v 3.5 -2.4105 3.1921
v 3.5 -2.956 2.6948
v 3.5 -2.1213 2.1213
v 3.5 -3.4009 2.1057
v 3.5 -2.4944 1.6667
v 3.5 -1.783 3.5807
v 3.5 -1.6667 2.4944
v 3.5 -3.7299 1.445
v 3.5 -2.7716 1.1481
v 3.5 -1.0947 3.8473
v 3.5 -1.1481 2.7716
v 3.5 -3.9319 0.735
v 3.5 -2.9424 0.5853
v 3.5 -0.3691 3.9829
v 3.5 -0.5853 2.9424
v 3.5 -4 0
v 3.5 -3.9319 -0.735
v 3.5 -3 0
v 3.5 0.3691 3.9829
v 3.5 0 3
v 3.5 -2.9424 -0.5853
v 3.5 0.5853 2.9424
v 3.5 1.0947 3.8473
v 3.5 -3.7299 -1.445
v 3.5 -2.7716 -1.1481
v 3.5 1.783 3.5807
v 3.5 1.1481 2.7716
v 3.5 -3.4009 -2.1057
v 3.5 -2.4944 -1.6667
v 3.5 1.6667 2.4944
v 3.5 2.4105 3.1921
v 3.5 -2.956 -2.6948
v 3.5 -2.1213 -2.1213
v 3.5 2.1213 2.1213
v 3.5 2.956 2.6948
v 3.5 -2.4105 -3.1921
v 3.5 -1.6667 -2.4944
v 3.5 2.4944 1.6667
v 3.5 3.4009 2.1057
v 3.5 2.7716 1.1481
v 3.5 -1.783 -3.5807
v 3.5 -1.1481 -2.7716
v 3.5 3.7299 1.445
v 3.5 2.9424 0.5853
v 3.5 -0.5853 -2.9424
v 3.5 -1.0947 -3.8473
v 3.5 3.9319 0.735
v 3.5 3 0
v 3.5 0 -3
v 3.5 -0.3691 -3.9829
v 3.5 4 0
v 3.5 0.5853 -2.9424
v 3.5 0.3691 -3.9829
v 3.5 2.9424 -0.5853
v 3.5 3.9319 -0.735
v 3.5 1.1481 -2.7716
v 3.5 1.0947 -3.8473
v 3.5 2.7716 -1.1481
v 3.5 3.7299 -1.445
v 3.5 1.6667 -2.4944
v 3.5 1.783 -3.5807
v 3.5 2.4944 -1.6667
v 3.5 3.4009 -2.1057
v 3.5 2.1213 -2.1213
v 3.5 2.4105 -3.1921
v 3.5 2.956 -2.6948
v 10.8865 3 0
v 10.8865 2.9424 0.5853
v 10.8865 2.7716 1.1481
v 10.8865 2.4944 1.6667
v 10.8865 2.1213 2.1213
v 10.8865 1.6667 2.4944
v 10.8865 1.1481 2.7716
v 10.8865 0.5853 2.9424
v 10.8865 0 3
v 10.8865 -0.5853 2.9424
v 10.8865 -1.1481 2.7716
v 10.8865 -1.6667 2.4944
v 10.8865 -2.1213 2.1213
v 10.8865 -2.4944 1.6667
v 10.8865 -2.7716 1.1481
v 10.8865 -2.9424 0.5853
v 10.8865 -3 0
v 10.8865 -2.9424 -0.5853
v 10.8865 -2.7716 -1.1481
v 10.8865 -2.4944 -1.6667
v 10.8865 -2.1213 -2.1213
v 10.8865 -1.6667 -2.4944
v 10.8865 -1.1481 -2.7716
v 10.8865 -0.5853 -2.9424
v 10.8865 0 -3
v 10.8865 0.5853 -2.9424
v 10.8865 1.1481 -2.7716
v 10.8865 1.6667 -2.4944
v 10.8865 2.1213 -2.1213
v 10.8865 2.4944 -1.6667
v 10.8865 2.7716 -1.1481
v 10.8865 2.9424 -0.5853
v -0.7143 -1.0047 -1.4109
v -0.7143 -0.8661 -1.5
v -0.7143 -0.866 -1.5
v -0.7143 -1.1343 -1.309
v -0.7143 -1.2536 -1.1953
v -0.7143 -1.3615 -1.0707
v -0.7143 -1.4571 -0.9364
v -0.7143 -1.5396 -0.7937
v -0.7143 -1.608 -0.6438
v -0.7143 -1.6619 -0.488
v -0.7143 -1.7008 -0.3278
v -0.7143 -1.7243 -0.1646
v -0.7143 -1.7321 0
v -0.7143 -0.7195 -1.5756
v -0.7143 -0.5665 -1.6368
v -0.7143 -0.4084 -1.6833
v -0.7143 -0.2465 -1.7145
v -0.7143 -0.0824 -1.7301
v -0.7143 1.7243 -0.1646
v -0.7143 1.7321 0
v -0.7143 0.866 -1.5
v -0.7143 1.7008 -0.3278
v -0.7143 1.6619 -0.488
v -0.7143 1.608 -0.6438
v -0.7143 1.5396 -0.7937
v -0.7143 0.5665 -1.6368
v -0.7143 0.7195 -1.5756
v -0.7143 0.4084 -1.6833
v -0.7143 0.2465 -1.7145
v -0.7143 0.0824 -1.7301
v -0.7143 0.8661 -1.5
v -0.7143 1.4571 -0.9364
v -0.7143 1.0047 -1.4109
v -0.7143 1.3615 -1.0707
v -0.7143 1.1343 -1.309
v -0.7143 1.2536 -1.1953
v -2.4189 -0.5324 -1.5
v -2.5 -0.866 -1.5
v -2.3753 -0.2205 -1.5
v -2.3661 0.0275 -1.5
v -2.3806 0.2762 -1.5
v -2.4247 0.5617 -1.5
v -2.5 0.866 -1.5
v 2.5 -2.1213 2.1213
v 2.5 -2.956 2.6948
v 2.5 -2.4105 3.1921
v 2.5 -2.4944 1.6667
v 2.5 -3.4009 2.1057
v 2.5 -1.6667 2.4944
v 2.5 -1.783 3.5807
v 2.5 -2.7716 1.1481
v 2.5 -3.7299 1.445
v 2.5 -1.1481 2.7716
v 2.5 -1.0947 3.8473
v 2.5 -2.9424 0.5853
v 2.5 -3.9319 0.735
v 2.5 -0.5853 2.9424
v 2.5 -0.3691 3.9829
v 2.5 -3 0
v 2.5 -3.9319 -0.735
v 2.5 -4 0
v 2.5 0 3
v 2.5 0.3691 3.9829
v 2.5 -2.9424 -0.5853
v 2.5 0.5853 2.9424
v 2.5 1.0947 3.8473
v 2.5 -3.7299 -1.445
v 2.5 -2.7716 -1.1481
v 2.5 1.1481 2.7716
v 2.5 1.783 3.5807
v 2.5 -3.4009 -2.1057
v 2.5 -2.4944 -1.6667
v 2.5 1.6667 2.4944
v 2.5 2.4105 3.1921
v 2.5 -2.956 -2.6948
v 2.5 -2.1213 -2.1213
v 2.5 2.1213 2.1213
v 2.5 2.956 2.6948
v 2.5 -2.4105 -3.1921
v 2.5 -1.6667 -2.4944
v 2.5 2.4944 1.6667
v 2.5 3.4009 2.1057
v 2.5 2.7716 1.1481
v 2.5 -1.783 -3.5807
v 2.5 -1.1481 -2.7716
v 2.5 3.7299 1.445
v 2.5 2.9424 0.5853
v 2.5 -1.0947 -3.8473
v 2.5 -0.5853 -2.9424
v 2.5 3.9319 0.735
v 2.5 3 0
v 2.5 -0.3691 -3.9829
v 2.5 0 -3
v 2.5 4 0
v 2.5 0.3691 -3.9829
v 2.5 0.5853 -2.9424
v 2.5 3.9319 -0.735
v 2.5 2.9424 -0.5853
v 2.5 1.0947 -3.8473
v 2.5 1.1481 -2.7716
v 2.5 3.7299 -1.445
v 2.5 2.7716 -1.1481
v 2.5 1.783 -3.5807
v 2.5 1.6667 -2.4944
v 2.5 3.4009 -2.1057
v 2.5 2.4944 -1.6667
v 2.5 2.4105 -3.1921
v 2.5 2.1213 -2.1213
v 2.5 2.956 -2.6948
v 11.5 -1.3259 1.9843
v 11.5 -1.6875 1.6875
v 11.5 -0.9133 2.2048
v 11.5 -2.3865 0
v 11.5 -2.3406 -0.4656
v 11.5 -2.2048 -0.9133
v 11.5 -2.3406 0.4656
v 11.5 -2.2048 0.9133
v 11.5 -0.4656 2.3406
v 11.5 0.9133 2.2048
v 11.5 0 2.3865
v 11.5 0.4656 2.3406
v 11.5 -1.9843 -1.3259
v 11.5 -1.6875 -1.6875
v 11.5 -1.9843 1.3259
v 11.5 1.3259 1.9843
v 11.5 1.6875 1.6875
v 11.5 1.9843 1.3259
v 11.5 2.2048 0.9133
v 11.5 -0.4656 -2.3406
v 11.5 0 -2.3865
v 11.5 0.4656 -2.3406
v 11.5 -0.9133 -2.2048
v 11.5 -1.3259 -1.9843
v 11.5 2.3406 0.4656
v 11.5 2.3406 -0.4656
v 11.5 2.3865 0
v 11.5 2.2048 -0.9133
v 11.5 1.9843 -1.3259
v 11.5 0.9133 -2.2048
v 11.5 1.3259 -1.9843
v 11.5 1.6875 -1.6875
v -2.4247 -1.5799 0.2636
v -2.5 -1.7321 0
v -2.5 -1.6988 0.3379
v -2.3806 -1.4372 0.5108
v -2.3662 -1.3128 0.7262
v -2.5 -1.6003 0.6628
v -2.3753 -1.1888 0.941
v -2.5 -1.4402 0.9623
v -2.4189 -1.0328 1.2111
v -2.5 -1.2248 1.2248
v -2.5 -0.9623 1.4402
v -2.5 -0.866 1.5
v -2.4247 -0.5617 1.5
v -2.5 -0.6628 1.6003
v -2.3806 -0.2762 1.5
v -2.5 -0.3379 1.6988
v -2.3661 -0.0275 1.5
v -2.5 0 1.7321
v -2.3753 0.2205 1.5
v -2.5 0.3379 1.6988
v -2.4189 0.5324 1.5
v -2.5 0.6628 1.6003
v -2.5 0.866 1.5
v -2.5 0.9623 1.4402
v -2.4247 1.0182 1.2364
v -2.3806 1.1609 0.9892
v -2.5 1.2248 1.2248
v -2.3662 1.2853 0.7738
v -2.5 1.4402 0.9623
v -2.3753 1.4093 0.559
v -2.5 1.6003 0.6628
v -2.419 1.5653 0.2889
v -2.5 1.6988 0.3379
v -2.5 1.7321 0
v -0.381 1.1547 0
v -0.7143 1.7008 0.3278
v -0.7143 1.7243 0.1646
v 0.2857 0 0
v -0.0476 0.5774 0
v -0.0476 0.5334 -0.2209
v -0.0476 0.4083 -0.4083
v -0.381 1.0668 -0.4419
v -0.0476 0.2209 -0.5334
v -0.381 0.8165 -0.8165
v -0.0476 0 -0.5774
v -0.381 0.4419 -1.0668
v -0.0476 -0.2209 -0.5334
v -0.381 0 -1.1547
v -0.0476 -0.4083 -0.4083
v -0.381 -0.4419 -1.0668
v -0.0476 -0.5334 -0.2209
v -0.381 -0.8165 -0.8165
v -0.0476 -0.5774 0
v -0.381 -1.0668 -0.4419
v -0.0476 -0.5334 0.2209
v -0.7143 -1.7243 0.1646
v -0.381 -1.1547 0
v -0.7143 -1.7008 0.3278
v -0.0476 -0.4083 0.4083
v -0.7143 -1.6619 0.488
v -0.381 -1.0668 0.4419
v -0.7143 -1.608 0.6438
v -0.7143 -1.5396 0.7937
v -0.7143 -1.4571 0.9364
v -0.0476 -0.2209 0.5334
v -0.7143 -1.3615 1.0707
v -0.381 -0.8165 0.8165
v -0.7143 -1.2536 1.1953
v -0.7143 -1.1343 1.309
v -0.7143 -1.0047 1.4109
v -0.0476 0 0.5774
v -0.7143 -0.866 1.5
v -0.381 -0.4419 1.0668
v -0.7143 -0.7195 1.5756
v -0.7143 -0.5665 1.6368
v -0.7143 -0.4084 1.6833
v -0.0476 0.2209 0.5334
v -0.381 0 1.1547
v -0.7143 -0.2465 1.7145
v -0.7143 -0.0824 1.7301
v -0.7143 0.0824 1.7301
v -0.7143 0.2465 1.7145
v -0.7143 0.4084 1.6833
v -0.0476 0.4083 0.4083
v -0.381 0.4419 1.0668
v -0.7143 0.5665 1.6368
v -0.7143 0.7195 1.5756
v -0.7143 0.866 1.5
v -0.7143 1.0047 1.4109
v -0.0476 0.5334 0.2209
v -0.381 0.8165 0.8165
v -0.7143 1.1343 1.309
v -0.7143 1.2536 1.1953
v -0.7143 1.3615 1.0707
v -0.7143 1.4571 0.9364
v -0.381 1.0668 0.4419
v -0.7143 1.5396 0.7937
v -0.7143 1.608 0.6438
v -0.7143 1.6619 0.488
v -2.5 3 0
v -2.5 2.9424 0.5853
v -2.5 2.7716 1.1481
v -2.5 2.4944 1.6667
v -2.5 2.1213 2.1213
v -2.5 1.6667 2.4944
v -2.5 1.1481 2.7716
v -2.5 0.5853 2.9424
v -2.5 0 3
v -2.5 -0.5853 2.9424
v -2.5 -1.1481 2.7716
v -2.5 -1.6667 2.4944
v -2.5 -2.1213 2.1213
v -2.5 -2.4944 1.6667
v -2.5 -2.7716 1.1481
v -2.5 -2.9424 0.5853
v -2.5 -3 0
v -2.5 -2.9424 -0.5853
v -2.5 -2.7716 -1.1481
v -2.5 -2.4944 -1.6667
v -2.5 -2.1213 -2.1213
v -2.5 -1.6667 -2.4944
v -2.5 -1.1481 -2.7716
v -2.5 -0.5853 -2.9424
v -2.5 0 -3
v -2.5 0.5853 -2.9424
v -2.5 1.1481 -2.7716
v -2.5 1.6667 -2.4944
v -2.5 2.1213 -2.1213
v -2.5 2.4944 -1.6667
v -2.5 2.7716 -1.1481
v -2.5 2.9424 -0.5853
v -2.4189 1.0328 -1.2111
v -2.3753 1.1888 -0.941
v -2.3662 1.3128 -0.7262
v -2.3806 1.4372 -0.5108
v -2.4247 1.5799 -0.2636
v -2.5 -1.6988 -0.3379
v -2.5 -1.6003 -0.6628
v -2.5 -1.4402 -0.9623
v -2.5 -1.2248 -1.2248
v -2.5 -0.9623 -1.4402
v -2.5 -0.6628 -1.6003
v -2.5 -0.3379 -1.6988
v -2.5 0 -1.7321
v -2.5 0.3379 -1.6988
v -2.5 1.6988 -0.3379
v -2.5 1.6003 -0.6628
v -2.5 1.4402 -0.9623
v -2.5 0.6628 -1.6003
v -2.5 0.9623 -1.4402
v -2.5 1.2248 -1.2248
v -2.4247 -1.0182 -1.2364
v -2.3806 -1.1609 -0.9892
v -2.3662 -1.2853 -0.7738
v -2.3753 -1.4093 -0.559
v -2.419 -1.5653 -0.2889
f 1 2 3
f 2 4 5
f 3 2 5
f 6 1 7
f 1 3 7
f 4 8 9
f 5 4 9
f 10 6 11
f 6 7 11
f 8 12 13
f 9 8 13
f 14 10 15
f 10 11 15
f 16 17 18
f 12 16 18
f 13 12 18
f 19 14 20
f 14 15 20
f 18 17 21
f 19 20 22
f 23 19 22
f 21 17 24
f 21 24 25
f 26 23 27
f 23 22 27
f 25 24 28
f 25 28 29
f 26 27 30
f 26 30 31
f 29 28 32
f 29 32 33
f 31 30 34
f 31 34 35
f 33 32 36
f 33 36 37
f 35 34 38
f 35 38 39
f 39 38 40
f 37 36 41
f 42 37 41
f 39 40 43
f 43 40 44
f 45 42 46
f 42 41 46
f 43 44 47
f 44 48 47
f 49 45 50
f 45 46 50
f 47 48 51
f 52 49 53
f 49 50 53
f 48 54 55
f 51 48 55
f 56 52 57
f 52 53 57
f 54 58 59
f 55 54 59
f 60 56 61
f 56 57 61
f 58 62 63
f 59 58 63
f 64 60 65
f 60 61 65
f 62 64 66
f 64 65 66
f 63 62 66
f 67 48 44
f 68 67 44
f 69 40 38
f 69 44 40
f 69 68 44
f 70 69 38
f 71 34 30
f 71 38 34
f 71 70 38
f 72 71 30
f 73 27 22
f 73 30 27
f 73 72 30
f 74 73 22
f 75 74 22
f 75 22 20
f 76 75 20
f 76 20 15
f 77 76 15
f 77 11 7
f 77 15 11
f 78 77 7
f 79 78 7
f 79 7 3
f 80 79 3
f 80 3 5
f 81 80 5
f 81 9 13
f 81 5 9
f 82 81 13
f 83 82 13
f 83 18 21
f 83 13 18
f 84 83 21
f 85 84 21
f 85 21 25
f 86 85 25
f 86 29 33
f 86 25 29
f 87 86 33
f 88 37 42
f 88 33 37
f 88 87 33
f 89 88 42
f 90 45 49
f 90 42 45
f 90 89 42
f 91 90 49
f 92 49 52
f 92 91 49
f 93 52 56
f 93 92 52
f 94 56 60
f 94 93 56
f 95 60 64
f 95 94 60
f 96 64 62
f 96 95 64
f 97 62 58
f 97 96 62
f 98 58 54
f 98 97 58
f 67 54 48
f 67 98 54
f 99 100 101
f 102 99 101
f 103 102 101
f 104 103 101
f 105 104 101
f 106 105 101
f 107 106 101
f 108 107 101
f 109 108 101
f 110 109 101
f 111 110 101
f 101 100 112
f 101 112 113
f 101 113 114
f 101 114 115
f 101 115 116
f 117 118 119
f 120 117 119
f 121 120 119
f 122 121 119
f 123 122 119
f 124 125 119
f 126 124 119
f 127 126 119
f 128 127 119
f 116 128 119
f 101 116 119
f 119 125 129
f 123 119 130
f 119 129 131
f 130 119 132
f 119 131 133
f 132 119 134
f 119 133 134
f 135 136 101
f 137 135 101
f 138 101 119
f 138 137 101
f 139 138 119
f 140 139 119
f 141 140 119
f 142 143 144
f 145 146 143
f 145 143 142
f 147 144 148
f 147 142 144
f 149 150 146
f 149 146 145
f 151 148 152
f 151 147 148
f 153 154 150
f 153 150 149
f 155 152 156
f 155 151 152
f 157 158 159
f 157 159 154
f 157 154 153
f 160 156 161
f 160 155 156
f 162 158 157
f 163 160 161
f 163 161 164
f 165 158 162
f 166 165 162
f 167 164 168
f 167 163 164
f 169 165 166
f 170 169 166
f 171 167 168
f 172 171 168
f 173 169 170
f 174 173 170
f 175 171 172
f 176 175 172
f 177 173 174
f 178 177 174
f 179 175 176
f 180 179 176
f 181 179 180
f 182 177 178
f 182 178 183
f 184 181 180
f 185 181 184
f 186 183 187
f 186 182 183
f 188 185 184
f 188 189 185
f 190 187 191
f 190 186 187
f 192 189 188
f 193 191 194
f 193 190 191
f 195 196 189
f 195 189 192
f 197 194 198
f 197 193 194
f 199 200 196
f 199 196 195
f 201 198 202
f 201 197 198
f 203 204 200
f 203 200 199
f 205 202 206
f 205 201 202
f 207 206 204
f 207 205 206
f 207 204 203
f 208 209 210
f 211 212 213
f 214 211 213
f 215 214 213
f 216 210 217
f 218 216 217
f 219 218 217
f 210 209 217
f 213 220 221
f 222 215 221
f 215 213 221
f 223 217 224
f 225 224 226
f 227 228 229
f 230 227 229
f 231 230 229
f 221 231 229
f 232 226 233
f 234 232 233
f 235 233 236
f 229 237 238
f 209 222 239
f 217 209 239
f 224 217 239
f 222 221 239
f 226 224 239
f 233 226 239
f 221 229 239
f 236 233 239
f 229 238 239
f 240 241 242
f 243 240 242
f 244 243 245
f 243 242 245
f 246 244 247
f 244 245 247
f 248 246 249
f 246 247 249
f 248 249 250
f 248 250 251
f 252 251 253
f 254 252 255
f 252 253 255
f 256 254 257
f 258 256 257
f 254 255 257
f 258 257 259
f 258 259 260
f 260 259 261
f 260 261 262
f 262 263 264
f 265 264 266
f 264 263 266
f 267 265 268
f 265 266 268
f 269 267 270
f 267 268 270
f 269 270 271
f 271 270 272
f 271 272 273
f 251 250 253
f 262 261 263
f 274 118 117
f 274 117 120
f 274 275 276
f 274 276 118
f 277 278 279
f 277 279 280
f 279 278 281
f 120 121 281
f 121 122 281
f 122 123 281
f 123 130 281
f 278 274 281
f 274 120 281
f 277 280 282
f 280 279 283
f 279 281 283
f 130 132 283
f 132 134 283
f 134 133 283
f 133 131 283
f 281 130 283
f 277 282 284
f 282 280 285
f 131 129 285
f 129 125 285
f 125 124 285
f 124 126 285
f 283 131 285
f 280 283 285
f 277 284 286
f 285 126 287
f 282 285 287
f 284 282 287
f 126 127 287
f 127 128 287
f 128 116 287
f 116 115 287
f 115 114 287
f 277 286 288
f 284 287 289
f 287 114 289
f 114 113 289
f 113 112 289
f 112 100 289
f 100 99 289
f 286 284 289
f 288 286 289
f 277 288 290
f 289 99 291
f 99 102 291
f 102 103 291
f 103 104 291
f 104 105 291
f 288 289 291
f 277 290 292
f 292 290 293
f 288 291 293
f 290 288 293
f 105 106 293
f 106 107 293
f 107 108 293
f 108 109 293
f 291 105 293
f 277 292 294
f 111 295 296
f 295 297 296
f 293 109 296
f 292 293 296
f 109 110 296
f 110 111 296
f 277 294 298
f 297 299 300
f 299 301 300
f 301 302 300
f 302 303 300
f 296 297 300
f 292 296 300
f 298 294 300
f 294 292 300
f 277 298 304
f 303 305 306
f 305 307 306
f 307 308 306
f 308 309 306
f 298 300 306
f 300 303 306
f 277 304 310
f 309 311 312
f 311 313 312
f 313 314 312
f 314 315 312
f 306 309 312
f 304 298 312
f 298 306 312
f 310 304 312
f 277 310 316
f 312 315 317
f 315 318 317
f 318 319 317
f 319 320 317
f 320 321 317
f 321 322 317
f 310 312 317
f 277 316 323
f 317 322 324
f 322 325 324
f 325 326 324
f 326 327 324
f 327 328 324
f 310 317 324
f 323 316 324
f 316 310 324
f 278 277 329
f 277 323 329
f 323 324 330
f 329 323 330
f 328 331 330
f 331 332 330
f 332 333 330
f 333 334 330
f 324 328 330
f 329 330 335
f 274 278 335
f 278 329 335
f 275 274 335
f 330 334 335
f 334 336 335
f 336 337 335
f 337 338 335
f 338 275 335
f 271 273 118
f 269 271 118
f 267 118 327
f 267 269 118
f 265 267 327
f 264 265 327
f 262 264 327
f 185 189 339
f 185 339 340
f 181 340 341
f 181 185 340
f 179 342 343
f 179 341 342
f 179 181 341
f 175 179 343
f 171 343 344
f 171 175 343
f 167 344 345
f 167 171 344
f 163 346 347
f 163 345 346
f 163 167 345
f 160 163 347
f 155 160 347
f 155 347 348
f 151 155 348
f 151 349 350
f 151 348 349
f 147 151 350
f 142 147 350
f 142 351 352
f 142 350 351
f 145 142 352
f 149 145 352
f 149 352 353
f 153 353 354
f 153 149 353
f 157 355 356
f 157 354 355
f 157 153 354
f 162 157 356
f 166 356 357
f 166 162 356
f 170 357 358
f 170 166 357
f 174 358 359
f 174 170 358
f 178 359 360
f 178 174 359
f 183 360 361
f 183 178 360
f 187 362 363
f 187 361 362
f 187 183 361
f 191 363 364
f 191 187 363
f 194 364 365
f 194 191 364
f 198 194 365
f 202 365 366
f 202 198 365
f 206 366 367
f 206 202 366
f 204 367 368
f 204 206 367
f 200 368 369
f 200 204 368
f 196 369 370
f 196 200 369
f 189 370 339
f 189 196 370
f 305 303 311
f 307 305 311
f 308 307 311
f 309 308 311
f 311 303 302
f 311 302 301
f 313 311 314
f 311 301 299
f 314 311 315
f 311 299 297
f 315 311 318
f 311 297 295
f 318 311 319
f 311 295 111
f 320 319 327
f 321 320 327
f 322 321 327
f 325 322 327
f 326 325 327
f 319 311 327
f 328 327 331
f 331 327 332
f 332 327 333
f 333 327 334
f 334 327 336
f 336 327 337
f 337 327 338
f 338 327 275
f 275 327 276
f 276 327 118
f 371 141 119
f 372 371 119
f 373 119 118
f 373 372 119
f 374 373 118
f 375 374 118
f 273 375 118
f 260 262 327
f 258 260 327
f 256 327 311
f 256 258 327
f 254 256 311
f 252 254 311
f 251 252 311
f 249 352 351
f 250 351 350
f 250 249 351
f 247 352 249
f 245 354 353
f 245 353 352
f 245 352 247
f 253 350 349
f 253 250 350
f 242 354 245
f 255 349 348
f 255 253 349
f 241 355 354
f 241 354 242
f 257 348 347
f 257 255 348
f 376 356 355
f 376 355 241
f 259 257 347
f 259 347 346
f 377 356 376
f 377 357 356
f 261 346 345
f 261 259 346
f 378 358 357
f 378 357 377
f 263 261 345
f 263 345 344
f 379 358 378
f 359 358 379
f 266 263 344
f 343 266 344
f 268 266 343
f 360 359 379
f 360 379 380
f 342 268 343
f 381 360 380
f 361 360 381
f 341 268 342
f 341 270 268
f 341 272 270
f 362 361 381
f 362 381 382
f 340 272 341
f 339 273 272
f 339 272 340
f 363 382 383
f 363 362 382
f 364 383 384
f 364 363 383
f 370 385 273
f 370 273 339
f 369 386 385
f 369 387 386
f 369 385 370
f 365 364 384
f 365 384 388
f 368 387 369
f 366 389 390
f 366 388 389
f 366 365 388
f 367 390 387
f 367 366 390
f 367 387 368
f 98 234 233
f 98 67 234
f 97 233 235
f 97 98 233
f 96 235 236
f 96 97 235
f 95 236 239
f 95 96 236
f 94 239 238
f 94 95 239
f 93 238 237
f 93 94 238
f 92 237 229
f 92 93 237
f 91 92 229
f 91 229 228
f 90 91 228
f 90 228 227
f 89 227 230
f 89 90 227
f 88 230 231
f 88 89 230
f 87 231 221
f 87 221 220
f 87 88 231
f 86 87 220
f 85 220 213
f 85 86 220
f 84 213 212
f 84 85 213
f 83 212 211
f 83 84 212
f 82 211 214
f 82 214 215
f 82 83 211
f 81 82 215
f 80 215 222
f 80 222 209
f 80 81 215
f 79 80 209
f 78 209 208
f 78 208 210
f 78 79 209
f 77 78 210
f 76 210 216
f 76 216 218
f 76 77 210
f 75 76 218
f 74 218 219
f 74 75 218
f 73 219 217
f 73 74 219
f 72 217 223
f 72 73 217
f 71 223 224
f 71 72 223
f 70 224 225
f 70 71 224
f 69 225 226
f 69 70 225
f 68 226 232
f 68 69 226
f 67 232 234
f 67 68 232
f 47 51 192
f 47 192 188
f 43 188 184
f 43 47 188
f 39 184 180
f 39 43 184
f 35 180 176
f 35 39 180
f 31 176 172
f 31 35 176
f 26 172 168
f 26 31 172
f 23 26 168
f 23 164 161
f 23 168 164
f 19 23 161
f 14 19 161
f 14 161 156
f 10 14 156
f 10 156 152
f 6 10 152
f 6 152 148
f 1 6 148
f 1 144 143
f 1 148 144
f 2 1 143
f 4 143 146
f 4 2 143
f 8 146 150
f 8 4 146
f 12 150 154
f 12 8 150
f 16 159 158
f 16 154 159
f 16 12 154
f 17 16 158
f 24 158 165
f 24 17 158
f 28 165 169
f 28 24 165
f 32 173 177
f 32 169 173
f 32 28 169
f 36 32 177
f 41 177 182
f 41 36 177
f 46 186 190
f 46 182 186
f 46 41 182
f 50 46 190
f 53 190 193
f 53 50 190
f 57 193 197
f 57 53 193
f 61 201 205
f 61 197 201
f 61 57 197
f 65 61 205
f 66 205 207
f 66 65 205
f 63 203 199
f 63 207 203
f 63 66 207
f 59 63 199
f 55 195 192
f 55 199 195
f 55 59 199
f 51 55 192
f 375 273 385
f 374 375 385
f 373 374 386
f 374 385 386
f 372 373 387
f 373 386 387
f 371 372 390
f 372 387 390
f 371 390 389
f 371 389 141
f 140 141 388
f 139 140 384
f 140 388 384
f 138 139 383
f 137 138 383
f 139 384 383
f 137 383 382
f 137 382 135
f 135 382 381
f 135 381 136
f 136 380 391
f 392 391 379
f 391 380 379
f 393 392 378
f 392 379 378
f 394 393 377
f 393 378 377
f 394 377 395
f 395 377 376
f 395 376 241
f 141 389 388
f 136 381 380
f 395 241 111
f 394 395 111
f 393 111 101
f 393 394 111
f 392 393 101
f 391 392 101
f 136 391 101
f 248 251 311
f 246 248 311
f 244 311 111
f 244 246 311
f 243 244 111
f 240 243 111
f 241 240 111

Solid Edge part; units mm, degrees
sketch "Sketch1" plane through (0, 0, 0) normal (0, 0, 1) x (1, 0, 0)
  line L0 (-2.5, 0) -> (-2.5, 3)
  line L1 (-2.5, 3) -> (2.5, 3)
  line L2 (2.5, 3) -> (2.5, 4)
  line L3 (2.5, 4) -> (3.5, 4)
  line L4 (3.5, 4) -> (3.5, 3)
  line L5 (3.5, 3) -> (10.8865, 3)
  line L6 (10.8865, 3) -> (11.5, 2.3865)
  line L7 (11.5, 2.3865) -> (11.5, 0)
  line L8 (11.5, 0) -> (-2.5, 0)
revolve "RevolvedProtrusion1" add sketch "Sketch1" angle 360 about axis through (11.5, 0, 0) along (-1, 0, 0)
cosmetic_thread "Thread1" size "M6"
sketch "Sketch2" plane through (0, 0, 0) normal (0, 0, 1) x (1, 0, 0)
  line L0 (-2.5, 0) -> (-2.5, 1.7321)
  line L1 (-2.5, 1.7321) -> (-1.5, 0)
  line L2 (-1.5, 0) -> (-2.5, 0)
revolve "RevolvedCutout1" cut sketch "Sketch2" angle 360 about axis through (-1.5, 0, 0) along (-1, 0, 0)
sketch "Sketch3" plane through (-2.5, 0, 0) normal (1, 0, 0) x (0, 1, 0)
  line L0 (0.866, 1.5) -> (-0.866, 1.5)
  line L1 (-0.866, 1.5) -> (-1.7321, 0)
  line L2 (-1.7321, 0) -> (-0.866, -1.5)
  line L3 (-0.866, -1.5) -> (0.866, -1.5)
  line L4 (0.866, -1.5) -> (1.7321, 0)
  line L5 (1.7321, 0) -> (0.866, 1.5)
extrude "ExtrudedCutout_1" cut sketch "Sketch3" along normal blind 1.7857
sketch "Sketch4" plane through (0, 0, 0) normal (0, 0, 1) x (1, 0, 0)
  line L0 (-0.7143, 0) -> (-0.7143, 1.7321)
  line L1 (-0.7143, 1.7321) -> (0.2857, 0)
  line L2 (0.2857, 0) -> (-0.7143, 0)
revolve "RevolvedCutout2" cut sketch "Sketch4" angle 360 about axis through (0.2857, 0, 0) along (-1, 0, 0)
properties material "Steel"
